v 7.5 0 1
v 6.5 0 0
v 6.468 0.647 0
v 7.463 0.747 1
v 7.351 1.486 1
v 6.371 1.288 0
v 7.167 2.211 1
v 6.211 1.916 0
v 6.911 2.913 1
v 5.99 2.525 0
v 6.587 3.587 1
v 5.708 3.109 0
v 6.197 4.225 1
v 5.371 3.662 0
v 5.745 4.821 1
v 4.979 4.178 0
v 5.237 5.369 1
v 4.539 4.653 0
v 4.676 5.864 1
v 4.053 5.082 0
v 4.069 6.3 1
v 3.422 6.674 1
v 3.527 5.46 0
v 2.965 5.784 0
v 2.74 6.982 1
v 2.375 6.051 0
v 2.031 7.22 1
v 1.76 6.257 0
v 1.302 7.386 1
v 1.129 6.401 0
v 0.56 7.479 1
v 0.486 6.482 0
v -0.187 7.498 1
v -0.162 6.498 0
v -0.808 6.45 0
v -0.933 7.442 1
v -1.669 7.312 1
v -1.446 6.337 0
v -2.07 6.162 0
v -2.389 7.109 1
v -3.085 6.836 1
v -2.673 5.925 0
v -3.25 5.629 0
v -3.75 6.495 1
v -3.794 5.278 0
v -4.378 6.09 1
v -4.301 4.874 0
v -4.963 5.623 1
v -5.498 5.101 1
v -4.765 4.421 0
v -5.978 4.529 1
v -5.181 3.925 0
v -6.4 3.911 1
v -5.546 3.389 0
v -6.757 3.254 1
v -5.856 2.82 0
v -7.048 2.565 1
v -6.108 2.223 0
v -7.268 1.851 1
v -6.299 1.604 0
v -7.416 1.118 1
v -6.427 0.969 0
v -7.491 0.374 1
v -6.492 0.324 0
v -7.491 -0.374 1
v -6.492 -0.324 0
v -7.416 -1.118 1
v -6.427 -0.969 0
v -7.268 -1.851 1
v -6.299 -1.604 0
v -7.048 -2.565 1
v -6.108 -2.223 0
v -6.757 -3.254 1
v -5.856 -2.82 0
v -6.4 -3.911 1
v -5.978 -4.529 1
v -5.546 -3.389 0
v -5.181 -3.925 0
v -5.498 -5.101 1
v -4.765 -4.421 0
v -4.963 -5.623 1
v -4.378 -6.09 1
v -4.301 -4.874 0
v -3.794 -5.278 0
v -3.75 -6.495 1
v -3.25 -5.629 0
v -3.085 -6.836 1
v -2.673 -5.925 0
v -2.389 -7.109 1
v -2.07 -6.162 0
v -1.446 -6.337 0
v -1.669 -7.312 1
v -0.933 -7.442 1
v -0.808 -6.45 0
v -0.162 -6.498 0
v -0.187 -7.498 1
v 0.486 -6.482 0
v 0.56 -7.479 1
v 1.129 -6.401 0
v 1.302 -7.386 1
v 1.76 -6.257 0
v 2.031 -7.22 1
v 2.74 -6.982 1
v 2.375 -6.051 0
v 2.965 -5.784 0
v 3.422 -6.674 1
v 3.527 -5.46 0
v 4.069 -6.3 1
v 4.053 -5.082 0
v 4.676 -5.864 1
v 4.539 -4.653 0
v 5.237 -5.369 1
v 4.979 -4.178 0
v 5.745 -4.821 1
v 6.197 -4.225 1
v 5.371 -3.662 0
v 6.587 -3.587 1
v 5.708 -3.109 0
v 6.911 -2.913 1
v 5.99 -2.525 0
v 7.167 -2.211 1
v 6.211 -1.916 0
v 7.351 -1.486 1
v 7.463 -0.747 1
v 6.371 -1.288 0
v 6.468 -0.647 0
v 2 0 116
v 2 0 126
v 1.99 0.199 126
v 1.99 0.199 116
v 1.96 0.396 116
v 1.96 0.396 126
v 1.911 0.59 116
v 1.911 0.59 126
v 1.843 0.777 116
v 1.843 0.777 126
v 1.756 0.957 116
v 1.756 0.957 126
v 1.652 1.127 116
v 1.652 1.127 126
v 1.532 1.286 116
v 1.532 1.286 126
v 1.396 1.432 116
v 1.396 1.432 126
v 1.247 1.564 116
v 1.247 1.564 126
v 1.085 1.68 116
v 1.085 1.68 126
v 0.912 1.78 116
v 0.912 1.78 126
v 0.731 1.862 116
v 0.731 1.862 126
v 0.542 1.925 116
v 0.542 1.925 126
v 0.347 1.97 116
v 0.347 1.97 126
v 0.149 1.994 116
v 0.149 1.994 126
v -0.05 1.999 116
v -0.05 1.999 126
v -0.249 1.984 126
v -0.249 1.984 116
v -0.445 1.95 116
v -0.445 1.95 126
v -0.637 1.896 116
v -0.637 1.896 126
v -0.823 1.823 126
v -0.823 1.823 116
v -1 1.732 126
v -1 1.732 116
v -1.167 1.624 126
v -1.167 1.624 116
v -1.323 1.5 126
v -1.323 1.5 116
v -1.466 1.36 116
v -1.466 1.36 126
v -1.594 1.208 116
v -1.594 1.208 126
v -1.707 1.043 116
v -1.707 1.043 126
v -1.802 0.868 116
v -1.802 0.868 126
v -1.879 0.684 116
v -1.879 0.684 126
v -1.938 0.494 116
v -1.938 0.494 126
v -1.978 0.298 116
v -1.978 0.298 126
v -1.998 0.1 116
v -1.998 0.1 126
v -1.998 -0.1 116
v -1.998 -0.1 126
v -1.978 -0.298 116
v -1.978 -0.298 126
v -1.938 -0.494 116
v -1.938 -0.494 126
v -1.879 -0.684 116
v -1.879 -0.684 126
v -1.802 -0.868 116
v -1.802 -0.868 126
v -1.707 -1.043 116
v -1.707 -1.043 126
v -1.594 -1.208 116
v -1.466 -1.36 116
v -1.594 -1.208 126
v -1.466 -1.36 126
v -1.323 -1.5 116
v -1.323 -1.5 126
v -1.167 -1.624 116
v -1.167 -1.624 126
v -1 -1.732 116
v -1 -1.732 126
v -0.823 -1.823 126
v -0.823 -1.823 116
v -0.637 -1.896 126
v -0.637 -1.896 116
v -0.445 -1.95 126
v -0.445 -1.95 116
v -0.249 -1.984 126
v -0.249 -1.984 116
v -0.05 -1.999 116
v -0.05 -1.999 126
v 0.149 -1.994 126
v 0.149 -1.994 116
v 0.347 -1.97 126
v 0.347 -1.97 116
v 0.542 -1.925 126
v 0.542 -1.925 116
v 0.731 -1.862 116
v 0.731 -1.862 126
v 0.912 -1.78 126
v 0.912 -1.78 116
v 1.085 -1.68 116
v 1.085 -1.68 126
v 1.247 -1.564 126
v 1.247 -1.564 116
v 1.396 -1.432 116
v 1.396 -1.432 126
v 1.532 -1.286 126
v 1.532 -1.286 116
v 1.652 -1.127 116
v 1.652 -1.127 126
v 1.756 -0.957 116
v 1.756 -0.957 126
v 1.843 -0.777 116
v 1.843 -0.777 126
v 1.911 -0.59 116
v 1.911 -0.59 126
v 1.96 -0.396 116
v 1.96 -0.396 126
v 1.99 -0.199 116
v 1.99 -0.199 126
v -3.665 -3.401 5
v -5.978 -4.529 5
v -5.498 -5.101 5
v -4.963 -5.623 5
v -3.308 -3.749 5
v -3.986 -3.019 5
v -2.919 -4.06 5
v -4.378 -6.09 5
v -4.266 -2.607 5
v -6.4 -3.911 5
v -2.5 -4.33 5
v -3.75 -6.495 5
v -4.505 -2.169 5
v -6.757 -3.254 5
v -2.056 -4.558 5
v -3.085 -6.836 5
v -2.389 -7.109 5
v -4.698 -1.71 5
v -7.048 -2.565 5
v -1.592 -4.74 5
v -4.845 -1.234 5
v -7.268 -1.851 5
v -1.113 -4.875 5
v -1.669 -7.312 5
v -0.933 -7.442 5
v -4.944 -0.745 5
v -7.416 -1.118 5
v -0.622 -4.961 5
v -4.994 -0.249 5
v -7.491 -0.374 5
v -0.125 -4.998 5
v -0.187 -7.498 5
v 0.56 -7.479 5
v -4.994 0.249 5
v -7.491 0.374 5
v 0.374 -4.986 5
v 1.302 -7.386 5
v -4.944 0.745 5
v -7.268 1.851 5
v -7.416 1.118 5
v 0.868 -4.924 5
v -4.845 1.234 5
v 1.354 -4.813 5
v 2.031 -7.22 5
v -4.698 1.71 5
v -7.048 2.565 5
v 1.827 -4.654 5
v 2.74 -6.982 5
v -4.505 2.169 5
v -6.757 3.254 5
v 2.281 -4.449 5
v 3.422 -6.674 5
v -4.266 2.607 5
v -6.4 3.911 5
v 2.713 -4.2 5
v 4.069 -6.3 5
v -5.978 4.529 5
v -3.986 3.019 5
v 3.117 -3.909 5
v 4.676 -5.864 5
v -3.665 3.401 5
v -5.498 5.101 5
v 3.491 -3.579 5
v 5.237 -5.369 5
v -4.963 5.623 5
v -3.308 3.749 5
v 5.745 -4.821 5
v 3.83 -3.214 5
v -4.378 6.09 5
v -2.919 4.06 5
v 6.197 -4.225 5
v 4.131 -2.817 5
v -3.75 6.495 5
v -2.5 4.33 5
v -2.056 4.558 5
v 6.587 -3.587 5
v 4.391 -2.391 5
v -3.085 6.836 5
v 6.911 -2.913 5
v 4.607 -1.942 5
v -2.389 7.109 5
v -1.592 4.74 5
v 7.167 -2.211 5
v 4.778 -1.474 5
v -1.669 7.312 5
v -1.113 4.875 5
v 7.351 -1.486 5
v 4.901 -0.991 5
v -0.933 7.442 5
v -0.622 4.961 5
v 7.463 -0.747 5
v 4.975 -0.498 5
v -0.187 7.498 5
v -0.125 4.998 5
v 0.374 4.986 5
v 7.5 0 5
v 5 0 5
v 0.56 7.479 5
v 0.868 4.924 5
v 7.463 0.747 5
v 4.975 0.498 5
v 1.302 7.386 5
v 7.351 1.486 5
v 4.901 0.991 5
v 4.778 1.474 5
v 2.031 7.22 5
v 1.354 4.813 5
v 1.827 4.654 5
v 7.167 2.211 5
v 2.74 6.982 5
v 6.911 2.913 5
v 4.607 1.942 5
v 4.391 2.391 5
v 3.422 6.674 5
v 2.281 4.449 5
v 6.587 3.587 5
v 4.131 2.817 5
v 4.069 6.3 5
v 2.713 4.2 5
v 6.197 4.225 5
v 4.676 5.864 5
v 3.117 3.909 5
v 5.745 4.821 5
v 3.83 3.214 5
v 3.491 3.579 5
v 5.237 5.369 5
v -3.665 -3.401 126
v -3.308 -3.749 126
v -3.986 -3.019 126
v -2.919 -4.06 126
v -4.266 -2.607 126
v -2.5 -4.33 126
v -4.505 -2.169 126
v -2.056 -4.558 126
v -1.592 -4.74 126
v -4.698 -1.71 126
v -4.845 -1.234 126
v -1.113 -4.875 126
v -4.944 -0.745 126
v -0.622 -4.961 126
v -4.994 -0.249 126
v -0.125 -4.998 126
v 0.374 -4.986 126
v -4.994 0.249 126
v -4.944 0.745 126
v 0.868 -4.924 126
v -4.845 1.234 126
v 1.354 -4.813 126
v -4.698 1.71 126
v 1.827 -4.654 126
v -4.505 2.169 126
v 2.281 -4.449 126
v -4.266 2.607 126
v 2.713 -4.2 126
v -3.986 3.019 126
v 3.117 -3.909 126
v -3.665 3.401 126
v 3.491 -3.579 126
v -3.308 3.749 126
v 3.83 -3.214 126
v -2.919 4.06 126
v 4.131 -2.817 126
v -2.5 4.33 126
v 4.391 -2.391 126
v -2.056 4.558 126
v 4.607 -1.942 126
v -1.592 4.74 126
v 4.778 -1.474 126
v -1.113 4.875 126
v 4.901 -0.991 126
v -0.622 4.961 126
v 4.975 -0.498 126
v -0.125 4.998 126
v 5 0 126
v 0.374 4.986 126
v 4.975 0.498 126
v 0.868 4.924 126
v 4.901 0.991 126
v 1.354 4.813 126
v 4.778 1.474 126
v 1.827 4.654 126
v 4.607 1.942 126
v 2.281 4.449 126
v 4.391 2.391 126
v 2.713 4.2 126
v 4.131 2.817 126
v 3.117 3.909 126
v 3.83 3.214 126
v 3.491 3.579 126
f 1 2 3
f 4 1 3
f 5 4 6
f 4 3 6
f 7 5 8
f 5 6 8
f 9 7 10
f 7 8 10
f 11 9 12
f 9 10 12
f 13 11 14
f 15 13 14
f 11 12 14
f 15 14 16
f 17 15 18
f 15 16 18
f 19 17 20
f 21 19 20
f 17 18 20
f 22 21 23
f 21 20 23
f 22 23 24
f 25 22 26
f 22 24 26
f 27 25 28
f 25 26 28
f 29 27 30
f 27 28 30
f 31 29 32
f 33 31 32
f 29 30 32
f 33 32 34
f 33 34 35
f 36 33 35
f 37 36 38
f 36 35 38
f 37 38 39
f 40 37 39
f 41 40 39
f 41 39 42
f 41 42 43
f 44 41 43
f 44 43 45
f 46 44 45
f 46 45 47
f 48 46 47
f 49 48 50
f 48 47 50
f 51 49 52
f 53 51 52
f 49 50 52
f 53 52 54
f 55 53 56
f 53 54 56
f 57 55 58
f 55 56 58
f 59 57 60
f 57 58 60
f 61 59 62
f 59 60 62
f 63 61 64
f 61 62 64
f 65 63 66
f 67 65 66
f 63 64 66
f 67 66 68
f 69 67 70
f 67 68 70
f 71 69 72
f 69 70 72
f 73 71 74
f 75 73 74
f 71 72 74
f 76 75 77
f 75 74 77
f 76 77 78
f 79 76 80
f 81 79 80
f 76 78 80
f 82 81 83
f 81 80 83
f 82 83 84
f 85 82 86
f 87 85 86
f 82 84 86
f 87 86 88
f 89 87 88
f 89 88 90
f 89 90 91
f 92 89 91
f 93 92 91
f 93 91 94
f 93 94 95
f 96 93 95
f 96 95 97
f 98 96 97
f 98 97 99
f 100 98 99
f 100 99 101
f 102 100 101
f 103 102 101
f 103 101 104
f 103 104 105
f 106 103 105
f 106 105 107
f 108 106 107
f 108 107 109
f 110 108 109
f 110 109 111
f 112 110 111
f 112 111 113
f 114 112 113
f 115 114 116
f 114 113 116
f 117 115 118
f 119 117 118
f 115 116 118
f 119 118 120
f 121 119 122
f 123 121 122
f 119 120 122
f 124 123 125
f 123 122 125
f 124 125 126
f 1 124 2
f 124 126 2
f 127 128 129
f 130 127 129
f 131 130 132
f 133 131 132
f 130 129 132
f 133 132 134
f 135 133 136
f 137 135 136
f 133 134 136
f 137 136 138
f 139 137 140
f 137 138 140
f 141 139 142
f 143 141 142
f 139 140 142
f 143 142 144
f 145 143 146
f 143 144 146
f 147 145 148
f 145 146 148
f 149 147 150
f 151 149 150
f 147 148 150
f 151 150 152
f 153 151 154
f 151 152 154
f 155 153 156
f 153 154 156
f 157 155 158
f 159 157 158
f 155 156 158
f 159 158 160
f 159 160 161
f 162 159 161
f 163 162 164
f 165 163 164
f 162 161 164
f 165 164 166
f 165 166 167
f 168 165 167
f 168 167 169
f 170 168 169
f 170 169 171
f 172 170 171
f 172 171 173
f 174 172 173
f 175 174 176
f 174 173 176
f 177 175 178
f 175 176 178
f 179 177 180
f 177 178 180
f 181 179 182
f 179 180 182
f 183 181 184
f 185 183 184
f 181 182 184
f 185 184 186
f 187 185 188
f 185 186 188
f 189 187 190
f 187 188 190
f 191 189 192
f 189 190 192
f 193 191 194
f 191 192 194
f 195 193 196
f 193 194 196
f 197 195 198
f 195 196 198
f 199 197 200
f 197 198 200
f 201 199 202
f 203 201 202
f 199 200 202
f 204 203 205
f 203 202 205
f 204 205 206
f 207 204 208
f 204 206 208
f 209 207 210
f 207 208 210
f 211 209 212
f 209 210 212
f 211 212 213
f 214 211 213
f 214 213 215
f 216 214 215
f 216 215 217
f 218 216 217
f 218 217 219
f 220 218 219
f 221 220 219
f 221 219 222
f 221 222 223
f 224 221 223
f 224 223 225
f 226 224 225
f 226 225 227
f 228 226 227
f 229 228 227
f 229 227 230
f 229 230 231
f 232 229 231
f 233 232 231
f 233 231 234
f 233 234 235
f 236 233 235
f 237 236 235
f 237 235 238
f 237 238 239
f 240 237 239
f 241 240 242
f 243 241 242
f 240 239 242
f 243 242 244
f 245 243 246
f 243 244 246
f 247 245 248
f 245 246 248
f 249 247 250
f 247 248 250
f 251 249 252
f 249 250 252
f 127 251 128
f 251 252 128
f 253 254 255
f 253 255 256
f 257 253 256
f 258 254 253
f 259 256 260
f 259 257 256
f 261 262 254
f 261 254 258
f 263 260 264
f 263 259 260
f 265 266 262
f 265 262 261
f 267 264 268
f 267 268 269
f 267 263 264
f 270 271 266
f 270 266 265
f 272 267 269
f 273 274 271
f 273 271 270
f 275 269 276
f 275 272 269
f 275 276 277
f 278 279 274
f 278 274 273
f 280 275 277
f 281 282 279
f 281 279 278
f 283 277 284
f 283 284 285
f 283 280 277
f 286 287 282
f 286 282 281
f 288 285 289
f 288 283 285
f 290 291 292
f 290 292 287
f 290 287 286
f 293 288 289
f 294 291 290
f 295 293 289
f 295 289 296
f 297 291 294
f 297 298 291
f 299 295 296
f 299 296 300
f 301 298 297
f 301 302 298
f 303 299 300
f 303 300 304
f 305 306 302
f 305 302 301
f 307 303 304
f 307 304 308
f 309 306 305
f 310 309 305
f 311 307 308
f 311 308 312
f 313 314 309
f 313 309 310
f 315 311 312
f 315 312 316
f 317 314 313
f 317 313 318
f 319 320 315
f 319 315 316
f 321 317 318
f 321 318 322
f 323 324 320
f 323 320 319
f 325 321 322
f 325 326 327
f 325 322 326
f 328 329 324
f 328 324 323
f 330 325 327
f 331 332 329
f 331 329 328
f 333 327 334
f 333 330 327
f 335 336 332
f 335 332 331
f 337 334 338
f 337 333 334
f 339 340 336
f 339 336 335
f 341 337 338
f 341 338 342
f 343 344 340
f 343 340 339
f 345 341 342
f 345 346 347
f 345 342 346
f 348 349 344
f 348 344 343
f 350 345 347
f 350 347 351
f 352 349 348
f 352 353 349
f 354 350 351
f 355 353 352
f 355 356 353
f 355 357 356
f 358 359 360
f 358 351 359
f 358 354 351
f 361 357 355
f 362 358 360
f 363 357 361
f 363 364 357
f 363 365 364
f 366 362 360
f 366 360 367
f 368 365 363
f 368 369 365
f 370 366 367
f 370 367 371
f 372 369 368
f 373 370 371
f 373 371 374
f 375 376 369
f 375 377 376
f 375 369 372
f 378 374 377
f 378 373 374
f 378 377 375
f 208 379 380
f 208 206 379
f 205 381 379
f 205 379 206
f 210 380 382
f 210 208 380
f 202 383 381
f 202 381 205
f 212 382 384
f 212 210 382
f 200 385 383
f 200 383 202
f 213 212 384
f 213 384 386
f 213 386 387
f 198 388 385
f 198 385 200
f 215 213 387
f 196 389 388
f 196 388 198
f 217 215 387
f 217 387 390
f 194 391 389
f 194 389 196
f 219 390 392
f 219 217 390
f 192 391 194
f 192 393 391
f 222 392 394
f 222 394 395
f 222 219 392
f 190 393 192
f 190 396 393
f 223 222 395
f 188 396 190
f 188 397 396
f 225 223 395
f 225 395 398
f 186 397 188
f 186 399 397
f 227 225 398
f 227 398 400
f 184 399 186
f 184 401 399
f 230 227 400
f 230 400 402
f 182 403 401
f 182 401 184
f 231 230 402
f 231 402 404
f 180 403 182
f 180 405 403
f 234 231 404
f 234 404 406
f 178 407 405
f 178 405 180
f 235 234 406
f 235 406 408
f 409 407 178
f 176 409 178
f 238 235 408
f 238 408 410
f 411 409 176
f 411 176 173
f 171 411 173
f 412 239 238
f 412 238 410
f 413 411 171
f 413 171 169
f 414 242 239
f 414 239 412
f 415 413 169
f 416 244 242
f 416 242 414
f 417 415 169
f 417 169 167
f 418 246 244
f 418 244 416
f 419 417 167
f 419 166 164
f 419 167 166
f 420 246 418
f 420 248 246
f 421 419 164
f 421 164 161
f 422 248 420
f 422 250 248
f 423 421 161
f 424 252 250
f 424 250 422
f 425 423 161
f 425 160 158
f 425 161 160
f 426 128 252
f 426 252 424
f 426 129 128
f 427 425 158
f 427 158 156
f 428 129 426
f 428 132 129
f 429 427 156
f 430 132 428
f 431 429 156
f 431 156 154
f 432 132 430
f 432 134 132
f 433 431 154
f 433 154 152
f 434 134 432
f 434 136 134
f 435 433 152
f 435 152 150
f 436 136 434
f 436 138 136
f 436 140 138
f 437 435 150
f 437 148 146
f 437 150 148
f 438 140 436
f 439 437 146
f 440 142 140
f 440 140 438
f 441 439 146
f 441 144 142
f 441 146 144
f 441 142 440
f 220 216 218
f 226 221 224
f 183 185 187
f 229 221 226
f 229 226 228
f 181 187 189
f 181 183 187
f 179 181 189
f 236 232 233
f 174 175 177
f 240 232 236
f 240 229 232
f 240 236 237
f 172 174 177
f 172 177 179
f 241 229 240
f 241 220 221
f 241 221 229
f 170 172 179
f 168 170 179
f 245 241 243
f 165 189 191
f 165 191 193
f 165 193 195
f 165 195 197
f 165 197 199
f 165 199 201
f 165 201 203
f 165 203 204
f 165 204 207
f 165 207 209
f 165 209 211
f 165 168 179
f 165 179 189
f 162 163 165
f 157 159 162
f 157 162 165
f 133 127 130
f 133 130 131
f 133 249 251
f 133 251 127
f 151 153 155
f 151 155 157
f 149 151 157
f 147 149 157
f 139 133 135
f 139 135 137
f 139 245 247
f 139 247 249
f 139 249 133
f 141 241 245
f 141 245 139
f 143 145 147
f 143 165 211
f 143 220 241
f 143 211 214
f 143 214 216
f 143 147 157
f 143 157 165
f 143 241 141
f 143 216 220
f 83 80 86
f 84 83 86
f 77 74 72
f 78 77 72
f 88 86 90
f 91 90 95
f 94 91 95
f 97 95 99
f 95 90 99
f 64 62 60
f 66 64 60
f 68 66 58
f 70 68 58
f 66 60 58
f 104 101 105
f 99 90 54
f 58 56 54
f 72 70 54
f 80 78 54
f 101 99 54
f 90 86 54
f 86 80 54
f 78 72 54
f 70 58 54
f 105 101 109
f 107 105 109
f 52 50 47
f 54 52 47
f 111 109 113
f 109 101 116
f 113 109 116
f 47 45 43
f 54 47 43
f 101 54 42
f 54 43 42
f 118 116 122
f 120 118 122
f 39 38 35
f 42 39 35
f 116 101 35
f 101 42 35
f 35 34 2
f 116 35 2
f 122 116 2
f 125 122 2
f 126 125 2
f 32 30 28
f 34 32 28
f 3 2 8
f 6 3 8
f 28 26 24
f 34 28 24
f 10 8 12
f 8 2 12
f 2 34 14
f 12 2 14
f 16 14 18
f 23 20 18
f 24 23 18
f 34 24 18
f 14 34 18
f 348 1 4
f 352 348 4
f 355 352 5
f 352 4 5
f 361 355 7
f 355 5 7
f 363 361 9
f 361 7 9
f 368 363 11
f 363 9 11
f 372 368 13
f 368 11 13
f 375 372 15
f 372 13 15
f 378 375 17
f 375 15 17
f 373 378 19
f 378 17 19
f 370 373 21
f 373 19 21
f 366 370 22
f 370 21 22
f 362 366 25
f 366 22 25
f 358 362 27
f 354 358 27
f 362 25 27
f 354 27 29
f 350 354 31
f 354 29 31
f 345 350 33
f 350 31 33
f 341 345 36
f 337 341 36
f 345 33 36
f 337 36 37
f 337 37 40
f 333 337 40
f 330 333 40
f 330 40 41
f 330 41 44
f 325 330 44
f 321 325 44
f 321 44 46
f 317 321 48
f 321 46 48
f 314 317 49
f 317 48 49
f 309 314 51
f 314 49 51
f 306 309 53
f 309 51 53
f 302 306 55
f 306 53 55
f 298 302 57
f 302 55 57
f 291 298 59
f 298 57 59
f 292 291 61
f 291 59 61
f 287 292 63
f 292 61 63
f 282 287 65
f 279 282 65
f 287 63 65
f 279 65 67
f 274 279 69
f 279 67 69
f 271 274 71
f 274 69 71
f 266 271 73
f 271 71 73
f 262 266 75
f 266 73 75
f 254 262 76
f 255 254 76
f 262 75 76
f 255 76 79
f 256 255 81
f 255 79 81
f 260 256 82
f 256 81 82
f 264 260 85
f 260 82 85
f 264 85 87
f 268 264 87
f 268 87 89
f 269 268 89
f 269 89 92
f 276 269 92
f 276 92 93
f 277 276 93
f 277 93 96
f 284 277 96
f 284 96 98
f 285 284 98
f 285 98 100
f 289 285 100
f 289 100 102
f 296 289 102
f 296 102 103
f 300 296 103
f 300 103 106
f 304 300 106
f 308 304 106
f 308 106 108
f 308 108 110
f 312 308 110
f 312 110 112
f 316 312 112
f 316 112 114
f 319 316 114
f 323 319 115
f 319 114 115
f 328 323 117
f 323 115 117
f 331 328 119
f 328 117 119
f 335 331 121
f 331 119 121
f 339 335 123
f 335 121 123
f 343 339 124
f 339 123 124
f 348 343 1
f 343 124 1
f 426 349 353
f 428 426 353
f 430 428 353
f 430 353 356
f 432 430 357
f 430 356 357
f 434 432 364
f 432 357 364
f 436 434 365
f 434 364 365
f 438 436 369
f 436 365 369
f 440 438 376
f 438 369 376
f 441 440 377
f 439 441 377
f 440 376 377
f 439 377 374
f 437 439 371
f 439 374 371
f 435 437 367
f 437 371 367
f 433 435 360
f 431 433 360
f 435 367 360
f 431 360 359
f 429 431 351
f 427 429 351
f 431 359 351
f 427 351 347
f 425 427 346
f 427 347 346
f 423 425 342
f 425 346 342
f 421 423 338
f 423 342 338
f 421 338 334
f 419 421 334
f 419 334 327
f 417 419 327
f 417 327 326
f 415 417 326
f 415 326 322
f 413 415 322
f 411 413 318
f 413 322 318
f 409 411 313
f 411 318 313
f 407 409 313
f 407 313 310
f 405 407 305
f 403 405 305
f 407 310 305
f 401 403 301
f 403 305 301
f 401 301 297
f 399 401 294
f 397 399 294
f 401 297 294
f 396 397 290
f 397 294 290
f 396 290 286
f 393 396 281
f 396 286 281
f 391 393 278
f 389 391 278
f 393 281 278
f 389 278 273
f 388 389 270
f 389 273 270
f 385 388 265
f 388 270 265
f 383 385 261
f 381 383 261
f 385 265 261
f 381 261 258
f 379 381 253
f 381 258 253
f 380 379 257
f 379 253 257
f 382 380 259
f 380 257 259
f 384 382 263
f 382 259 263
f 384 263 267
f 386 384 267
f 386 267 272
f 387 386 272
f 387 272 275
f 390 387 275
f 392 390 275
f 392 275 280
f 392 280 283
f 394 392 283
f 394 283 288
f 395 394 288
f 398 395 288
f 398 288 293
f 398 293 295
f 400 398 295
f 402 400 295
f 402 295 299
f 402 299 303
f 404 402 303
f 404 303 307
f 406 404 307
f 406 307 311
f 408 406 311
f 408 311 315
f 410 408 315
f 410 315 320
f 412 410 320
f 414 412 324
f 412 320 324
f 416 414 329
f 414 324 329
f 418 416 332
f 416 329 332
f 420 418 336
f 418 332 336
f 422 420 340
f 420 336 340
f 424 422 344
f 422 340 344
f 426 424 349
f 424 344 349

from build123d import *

# Parameters (mm, degrees)
SKETCH2_R           = 7.5
BOSS_EXTRUDE1_DEPTH = 5
CHAMFER1_SIZE       = 1
SKETCH3_R           = 5
BOSS_EXTRUDE2_DEPTH = 121
SKETCH4_R           = 2
CUT_EXTRUDE1_DEPTH  = 10


with BuildPart() as part:
    # Sketch2 → Boss-Extrude1 (new body)
    with BuildSketch(Plane.XY):
        Circle(SKETCH2_R)
    extrude(amount=BOSS_EXTRUDE1_DEPTH)

    # Chamfer1
    chamfer1_edges = [part.edges().sort_by_distance(p)[0] for p in [
        (-7.5, 0, 0),
    ]]
    chamfer(chamfer1_edges, length=CHAMFER1_SIZE)

    # Sketch3 → Boss-Extrude2 (add)
    with BuildSketch(Plane.XY.offset(5)):
        Circle(SKETCH3_R)
    extrude(amount=BOSS_EXTRUDE2_DEPTH)

    # Sketch4 → Cut-Extrude1 (cut)
    with BuildSketch(Plane.XY.offset(126)):
        Circle(SKETCH4_R)
    extrude(amount=-CUT_EXTRUDE1_DEPTH, mode=Mode.SUBTRACT)


solid = part.part
